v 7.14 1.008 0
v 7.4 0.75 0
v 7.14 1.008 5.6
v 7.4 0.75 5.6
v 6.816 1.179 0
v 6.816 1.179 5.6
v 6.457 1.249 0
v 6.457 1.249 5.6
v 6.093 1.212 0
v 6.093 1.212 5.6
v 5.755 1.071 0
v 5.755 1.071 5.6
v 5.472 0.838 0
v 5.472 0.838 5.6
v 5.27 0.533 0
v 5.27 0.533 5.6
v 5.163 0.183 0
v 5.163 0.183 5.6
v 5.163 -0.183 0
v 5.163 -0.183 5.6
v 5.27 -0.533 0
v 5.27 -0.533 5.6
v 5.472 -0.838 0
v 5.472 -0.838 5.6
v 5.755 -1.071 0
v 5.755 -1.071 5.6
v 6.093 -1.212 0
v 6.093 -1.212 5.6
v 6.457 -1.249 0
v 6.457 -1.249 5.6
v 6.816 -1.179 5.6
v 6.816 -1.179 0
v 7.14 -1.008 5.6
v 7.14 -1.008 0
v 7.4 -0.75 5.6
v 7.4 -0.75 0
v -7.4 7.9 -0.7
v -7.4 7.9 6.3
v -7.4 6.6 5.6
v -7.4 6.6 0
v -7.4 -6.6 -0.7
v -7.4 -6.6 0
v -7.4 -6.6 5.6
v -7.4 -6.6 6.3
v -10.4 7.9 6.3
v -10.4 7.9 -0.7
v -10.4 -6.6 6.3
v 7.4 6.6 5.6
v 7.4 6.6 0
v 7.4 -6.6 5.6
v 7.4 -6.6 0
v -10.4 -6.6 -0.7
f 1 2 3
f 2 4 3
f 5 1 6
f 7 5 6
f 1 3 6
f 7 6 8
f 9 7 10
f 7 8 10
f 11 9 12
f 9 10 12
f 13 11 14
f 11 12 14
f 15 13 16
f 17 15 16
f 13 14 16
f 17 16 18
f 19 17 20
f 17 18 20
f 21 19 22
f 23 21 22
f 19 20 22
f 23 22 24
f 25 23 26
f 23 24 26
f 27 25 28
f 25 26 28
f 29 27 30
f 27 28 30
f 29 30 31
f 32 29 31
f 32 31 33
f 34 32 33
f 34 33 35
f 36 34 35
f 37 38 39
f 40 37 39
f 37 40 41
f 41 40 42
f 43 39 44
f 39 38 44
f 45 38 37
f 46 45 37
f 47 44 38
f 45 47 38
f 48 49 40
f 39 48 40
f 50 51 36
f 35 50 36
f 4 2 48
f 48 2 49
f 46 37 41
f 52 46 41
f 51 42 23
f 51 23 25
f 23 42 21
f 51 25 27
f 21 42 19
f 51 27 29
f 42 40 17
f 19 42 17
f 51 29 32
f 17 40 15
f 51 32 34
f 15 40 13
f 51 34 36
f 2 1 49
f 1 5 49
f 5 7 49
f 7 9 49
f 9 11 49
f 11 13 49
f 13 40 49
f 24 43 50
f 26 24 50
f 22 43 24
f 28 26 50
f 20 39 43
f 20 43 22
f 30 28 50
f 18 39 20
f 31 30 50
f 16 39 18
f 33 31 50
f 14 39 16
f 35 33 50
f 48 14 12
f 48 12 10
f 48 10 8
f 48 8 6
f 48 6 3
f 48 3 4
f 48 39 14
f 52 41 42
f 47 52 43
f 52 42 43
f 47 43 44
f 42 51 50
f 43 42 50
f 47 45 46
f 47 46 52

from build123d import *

# Parameters (mm, degrees)
F1_DEPTH = 5.6
F2_D     = 2.5
F2_DEPTH = 12
F3_W     = 13.2
F3_H     = 5.6
F4_DEPTH = 3


with BuildPart() as f1:
    # F0 (on Top) → F1 (new body)
    with BuildSketch(Plane.XY):
        with BuildLine():
            Line((7.4, 6.6), (-7.4, 6.6))
            Line((-7.4, 6.6), (-7.4, 0))
            Line((-7.4, 0), (5.3, 0))
            ThreePointArc((5.3, 0), (6.165479, 1.074709), (7.4, 0.458258))
            Line((7.4, 0.458258), (7.4, 6.6))
        make_face()
        with BuildLine():
            Line((5.3, 0), (-7.4, 0))
            Line((-7.4, 0), (-7.4, -6.6))
            Line((-7.4, -6.6), (7.4, -6.6))
            Line((7.4, -6.6), (7.4, -0.458258))
            ThreePointArc((7.4, -0.458258), (6.165479, -1.074709), (5.3, 0))
        make_face()
        with BuildLine():
            ThreePointArc((7.5, 0), (7.474709, 0.234521), (7.4, 0.458258))
            Line((7.4, 0.458258), (7.4, -0.458258))
            ThreePointArc((7.4, -0.458258), (7.474709, -0.234521), (7.5, 0))
        make_face()
        with BuildLine():
            Line((7.4, -0.458258), (7.4, 0.458258))
            ThreePointArc((7.4, 0.458258), (6.165479, 1.074709), (5.3, 0))
            ThreePointArc((5.3, 0), (6.165479, -1.074709), (7.4, -0.458258))
        make_face()
    extrude(amount=F1_DEPTH)

    # F2
    with Locations(Plane(origin=(0, 0, 0), x_dir=(1, 0, 0), z_dir=(0, 0, -1))):
        with Locations((6.4, 0)):
            Hole(F2_D / 2, depth=F2_DEPTH)

    # F3 (on face) → F4 (join)
    with BuildSketch(Plane(origin=(-7.4, 0, 0), x_dir=(0, -1, 0), z_dir=(-1, 0, 0))):
        Polygon((6.6, 6.3), (-7.9, 6.3), (-7.9, -0.7), (6.6, -0.7), (6.6, 0), (-6.6, 0), (-6.6, 5.6), (6.6, 5.6), align=None)
        with Locations((0, 2.8)):
            Rectangle(F3_W, F3_H)
    extrude(amount=F4_DEPTH)


solid = f1.part
